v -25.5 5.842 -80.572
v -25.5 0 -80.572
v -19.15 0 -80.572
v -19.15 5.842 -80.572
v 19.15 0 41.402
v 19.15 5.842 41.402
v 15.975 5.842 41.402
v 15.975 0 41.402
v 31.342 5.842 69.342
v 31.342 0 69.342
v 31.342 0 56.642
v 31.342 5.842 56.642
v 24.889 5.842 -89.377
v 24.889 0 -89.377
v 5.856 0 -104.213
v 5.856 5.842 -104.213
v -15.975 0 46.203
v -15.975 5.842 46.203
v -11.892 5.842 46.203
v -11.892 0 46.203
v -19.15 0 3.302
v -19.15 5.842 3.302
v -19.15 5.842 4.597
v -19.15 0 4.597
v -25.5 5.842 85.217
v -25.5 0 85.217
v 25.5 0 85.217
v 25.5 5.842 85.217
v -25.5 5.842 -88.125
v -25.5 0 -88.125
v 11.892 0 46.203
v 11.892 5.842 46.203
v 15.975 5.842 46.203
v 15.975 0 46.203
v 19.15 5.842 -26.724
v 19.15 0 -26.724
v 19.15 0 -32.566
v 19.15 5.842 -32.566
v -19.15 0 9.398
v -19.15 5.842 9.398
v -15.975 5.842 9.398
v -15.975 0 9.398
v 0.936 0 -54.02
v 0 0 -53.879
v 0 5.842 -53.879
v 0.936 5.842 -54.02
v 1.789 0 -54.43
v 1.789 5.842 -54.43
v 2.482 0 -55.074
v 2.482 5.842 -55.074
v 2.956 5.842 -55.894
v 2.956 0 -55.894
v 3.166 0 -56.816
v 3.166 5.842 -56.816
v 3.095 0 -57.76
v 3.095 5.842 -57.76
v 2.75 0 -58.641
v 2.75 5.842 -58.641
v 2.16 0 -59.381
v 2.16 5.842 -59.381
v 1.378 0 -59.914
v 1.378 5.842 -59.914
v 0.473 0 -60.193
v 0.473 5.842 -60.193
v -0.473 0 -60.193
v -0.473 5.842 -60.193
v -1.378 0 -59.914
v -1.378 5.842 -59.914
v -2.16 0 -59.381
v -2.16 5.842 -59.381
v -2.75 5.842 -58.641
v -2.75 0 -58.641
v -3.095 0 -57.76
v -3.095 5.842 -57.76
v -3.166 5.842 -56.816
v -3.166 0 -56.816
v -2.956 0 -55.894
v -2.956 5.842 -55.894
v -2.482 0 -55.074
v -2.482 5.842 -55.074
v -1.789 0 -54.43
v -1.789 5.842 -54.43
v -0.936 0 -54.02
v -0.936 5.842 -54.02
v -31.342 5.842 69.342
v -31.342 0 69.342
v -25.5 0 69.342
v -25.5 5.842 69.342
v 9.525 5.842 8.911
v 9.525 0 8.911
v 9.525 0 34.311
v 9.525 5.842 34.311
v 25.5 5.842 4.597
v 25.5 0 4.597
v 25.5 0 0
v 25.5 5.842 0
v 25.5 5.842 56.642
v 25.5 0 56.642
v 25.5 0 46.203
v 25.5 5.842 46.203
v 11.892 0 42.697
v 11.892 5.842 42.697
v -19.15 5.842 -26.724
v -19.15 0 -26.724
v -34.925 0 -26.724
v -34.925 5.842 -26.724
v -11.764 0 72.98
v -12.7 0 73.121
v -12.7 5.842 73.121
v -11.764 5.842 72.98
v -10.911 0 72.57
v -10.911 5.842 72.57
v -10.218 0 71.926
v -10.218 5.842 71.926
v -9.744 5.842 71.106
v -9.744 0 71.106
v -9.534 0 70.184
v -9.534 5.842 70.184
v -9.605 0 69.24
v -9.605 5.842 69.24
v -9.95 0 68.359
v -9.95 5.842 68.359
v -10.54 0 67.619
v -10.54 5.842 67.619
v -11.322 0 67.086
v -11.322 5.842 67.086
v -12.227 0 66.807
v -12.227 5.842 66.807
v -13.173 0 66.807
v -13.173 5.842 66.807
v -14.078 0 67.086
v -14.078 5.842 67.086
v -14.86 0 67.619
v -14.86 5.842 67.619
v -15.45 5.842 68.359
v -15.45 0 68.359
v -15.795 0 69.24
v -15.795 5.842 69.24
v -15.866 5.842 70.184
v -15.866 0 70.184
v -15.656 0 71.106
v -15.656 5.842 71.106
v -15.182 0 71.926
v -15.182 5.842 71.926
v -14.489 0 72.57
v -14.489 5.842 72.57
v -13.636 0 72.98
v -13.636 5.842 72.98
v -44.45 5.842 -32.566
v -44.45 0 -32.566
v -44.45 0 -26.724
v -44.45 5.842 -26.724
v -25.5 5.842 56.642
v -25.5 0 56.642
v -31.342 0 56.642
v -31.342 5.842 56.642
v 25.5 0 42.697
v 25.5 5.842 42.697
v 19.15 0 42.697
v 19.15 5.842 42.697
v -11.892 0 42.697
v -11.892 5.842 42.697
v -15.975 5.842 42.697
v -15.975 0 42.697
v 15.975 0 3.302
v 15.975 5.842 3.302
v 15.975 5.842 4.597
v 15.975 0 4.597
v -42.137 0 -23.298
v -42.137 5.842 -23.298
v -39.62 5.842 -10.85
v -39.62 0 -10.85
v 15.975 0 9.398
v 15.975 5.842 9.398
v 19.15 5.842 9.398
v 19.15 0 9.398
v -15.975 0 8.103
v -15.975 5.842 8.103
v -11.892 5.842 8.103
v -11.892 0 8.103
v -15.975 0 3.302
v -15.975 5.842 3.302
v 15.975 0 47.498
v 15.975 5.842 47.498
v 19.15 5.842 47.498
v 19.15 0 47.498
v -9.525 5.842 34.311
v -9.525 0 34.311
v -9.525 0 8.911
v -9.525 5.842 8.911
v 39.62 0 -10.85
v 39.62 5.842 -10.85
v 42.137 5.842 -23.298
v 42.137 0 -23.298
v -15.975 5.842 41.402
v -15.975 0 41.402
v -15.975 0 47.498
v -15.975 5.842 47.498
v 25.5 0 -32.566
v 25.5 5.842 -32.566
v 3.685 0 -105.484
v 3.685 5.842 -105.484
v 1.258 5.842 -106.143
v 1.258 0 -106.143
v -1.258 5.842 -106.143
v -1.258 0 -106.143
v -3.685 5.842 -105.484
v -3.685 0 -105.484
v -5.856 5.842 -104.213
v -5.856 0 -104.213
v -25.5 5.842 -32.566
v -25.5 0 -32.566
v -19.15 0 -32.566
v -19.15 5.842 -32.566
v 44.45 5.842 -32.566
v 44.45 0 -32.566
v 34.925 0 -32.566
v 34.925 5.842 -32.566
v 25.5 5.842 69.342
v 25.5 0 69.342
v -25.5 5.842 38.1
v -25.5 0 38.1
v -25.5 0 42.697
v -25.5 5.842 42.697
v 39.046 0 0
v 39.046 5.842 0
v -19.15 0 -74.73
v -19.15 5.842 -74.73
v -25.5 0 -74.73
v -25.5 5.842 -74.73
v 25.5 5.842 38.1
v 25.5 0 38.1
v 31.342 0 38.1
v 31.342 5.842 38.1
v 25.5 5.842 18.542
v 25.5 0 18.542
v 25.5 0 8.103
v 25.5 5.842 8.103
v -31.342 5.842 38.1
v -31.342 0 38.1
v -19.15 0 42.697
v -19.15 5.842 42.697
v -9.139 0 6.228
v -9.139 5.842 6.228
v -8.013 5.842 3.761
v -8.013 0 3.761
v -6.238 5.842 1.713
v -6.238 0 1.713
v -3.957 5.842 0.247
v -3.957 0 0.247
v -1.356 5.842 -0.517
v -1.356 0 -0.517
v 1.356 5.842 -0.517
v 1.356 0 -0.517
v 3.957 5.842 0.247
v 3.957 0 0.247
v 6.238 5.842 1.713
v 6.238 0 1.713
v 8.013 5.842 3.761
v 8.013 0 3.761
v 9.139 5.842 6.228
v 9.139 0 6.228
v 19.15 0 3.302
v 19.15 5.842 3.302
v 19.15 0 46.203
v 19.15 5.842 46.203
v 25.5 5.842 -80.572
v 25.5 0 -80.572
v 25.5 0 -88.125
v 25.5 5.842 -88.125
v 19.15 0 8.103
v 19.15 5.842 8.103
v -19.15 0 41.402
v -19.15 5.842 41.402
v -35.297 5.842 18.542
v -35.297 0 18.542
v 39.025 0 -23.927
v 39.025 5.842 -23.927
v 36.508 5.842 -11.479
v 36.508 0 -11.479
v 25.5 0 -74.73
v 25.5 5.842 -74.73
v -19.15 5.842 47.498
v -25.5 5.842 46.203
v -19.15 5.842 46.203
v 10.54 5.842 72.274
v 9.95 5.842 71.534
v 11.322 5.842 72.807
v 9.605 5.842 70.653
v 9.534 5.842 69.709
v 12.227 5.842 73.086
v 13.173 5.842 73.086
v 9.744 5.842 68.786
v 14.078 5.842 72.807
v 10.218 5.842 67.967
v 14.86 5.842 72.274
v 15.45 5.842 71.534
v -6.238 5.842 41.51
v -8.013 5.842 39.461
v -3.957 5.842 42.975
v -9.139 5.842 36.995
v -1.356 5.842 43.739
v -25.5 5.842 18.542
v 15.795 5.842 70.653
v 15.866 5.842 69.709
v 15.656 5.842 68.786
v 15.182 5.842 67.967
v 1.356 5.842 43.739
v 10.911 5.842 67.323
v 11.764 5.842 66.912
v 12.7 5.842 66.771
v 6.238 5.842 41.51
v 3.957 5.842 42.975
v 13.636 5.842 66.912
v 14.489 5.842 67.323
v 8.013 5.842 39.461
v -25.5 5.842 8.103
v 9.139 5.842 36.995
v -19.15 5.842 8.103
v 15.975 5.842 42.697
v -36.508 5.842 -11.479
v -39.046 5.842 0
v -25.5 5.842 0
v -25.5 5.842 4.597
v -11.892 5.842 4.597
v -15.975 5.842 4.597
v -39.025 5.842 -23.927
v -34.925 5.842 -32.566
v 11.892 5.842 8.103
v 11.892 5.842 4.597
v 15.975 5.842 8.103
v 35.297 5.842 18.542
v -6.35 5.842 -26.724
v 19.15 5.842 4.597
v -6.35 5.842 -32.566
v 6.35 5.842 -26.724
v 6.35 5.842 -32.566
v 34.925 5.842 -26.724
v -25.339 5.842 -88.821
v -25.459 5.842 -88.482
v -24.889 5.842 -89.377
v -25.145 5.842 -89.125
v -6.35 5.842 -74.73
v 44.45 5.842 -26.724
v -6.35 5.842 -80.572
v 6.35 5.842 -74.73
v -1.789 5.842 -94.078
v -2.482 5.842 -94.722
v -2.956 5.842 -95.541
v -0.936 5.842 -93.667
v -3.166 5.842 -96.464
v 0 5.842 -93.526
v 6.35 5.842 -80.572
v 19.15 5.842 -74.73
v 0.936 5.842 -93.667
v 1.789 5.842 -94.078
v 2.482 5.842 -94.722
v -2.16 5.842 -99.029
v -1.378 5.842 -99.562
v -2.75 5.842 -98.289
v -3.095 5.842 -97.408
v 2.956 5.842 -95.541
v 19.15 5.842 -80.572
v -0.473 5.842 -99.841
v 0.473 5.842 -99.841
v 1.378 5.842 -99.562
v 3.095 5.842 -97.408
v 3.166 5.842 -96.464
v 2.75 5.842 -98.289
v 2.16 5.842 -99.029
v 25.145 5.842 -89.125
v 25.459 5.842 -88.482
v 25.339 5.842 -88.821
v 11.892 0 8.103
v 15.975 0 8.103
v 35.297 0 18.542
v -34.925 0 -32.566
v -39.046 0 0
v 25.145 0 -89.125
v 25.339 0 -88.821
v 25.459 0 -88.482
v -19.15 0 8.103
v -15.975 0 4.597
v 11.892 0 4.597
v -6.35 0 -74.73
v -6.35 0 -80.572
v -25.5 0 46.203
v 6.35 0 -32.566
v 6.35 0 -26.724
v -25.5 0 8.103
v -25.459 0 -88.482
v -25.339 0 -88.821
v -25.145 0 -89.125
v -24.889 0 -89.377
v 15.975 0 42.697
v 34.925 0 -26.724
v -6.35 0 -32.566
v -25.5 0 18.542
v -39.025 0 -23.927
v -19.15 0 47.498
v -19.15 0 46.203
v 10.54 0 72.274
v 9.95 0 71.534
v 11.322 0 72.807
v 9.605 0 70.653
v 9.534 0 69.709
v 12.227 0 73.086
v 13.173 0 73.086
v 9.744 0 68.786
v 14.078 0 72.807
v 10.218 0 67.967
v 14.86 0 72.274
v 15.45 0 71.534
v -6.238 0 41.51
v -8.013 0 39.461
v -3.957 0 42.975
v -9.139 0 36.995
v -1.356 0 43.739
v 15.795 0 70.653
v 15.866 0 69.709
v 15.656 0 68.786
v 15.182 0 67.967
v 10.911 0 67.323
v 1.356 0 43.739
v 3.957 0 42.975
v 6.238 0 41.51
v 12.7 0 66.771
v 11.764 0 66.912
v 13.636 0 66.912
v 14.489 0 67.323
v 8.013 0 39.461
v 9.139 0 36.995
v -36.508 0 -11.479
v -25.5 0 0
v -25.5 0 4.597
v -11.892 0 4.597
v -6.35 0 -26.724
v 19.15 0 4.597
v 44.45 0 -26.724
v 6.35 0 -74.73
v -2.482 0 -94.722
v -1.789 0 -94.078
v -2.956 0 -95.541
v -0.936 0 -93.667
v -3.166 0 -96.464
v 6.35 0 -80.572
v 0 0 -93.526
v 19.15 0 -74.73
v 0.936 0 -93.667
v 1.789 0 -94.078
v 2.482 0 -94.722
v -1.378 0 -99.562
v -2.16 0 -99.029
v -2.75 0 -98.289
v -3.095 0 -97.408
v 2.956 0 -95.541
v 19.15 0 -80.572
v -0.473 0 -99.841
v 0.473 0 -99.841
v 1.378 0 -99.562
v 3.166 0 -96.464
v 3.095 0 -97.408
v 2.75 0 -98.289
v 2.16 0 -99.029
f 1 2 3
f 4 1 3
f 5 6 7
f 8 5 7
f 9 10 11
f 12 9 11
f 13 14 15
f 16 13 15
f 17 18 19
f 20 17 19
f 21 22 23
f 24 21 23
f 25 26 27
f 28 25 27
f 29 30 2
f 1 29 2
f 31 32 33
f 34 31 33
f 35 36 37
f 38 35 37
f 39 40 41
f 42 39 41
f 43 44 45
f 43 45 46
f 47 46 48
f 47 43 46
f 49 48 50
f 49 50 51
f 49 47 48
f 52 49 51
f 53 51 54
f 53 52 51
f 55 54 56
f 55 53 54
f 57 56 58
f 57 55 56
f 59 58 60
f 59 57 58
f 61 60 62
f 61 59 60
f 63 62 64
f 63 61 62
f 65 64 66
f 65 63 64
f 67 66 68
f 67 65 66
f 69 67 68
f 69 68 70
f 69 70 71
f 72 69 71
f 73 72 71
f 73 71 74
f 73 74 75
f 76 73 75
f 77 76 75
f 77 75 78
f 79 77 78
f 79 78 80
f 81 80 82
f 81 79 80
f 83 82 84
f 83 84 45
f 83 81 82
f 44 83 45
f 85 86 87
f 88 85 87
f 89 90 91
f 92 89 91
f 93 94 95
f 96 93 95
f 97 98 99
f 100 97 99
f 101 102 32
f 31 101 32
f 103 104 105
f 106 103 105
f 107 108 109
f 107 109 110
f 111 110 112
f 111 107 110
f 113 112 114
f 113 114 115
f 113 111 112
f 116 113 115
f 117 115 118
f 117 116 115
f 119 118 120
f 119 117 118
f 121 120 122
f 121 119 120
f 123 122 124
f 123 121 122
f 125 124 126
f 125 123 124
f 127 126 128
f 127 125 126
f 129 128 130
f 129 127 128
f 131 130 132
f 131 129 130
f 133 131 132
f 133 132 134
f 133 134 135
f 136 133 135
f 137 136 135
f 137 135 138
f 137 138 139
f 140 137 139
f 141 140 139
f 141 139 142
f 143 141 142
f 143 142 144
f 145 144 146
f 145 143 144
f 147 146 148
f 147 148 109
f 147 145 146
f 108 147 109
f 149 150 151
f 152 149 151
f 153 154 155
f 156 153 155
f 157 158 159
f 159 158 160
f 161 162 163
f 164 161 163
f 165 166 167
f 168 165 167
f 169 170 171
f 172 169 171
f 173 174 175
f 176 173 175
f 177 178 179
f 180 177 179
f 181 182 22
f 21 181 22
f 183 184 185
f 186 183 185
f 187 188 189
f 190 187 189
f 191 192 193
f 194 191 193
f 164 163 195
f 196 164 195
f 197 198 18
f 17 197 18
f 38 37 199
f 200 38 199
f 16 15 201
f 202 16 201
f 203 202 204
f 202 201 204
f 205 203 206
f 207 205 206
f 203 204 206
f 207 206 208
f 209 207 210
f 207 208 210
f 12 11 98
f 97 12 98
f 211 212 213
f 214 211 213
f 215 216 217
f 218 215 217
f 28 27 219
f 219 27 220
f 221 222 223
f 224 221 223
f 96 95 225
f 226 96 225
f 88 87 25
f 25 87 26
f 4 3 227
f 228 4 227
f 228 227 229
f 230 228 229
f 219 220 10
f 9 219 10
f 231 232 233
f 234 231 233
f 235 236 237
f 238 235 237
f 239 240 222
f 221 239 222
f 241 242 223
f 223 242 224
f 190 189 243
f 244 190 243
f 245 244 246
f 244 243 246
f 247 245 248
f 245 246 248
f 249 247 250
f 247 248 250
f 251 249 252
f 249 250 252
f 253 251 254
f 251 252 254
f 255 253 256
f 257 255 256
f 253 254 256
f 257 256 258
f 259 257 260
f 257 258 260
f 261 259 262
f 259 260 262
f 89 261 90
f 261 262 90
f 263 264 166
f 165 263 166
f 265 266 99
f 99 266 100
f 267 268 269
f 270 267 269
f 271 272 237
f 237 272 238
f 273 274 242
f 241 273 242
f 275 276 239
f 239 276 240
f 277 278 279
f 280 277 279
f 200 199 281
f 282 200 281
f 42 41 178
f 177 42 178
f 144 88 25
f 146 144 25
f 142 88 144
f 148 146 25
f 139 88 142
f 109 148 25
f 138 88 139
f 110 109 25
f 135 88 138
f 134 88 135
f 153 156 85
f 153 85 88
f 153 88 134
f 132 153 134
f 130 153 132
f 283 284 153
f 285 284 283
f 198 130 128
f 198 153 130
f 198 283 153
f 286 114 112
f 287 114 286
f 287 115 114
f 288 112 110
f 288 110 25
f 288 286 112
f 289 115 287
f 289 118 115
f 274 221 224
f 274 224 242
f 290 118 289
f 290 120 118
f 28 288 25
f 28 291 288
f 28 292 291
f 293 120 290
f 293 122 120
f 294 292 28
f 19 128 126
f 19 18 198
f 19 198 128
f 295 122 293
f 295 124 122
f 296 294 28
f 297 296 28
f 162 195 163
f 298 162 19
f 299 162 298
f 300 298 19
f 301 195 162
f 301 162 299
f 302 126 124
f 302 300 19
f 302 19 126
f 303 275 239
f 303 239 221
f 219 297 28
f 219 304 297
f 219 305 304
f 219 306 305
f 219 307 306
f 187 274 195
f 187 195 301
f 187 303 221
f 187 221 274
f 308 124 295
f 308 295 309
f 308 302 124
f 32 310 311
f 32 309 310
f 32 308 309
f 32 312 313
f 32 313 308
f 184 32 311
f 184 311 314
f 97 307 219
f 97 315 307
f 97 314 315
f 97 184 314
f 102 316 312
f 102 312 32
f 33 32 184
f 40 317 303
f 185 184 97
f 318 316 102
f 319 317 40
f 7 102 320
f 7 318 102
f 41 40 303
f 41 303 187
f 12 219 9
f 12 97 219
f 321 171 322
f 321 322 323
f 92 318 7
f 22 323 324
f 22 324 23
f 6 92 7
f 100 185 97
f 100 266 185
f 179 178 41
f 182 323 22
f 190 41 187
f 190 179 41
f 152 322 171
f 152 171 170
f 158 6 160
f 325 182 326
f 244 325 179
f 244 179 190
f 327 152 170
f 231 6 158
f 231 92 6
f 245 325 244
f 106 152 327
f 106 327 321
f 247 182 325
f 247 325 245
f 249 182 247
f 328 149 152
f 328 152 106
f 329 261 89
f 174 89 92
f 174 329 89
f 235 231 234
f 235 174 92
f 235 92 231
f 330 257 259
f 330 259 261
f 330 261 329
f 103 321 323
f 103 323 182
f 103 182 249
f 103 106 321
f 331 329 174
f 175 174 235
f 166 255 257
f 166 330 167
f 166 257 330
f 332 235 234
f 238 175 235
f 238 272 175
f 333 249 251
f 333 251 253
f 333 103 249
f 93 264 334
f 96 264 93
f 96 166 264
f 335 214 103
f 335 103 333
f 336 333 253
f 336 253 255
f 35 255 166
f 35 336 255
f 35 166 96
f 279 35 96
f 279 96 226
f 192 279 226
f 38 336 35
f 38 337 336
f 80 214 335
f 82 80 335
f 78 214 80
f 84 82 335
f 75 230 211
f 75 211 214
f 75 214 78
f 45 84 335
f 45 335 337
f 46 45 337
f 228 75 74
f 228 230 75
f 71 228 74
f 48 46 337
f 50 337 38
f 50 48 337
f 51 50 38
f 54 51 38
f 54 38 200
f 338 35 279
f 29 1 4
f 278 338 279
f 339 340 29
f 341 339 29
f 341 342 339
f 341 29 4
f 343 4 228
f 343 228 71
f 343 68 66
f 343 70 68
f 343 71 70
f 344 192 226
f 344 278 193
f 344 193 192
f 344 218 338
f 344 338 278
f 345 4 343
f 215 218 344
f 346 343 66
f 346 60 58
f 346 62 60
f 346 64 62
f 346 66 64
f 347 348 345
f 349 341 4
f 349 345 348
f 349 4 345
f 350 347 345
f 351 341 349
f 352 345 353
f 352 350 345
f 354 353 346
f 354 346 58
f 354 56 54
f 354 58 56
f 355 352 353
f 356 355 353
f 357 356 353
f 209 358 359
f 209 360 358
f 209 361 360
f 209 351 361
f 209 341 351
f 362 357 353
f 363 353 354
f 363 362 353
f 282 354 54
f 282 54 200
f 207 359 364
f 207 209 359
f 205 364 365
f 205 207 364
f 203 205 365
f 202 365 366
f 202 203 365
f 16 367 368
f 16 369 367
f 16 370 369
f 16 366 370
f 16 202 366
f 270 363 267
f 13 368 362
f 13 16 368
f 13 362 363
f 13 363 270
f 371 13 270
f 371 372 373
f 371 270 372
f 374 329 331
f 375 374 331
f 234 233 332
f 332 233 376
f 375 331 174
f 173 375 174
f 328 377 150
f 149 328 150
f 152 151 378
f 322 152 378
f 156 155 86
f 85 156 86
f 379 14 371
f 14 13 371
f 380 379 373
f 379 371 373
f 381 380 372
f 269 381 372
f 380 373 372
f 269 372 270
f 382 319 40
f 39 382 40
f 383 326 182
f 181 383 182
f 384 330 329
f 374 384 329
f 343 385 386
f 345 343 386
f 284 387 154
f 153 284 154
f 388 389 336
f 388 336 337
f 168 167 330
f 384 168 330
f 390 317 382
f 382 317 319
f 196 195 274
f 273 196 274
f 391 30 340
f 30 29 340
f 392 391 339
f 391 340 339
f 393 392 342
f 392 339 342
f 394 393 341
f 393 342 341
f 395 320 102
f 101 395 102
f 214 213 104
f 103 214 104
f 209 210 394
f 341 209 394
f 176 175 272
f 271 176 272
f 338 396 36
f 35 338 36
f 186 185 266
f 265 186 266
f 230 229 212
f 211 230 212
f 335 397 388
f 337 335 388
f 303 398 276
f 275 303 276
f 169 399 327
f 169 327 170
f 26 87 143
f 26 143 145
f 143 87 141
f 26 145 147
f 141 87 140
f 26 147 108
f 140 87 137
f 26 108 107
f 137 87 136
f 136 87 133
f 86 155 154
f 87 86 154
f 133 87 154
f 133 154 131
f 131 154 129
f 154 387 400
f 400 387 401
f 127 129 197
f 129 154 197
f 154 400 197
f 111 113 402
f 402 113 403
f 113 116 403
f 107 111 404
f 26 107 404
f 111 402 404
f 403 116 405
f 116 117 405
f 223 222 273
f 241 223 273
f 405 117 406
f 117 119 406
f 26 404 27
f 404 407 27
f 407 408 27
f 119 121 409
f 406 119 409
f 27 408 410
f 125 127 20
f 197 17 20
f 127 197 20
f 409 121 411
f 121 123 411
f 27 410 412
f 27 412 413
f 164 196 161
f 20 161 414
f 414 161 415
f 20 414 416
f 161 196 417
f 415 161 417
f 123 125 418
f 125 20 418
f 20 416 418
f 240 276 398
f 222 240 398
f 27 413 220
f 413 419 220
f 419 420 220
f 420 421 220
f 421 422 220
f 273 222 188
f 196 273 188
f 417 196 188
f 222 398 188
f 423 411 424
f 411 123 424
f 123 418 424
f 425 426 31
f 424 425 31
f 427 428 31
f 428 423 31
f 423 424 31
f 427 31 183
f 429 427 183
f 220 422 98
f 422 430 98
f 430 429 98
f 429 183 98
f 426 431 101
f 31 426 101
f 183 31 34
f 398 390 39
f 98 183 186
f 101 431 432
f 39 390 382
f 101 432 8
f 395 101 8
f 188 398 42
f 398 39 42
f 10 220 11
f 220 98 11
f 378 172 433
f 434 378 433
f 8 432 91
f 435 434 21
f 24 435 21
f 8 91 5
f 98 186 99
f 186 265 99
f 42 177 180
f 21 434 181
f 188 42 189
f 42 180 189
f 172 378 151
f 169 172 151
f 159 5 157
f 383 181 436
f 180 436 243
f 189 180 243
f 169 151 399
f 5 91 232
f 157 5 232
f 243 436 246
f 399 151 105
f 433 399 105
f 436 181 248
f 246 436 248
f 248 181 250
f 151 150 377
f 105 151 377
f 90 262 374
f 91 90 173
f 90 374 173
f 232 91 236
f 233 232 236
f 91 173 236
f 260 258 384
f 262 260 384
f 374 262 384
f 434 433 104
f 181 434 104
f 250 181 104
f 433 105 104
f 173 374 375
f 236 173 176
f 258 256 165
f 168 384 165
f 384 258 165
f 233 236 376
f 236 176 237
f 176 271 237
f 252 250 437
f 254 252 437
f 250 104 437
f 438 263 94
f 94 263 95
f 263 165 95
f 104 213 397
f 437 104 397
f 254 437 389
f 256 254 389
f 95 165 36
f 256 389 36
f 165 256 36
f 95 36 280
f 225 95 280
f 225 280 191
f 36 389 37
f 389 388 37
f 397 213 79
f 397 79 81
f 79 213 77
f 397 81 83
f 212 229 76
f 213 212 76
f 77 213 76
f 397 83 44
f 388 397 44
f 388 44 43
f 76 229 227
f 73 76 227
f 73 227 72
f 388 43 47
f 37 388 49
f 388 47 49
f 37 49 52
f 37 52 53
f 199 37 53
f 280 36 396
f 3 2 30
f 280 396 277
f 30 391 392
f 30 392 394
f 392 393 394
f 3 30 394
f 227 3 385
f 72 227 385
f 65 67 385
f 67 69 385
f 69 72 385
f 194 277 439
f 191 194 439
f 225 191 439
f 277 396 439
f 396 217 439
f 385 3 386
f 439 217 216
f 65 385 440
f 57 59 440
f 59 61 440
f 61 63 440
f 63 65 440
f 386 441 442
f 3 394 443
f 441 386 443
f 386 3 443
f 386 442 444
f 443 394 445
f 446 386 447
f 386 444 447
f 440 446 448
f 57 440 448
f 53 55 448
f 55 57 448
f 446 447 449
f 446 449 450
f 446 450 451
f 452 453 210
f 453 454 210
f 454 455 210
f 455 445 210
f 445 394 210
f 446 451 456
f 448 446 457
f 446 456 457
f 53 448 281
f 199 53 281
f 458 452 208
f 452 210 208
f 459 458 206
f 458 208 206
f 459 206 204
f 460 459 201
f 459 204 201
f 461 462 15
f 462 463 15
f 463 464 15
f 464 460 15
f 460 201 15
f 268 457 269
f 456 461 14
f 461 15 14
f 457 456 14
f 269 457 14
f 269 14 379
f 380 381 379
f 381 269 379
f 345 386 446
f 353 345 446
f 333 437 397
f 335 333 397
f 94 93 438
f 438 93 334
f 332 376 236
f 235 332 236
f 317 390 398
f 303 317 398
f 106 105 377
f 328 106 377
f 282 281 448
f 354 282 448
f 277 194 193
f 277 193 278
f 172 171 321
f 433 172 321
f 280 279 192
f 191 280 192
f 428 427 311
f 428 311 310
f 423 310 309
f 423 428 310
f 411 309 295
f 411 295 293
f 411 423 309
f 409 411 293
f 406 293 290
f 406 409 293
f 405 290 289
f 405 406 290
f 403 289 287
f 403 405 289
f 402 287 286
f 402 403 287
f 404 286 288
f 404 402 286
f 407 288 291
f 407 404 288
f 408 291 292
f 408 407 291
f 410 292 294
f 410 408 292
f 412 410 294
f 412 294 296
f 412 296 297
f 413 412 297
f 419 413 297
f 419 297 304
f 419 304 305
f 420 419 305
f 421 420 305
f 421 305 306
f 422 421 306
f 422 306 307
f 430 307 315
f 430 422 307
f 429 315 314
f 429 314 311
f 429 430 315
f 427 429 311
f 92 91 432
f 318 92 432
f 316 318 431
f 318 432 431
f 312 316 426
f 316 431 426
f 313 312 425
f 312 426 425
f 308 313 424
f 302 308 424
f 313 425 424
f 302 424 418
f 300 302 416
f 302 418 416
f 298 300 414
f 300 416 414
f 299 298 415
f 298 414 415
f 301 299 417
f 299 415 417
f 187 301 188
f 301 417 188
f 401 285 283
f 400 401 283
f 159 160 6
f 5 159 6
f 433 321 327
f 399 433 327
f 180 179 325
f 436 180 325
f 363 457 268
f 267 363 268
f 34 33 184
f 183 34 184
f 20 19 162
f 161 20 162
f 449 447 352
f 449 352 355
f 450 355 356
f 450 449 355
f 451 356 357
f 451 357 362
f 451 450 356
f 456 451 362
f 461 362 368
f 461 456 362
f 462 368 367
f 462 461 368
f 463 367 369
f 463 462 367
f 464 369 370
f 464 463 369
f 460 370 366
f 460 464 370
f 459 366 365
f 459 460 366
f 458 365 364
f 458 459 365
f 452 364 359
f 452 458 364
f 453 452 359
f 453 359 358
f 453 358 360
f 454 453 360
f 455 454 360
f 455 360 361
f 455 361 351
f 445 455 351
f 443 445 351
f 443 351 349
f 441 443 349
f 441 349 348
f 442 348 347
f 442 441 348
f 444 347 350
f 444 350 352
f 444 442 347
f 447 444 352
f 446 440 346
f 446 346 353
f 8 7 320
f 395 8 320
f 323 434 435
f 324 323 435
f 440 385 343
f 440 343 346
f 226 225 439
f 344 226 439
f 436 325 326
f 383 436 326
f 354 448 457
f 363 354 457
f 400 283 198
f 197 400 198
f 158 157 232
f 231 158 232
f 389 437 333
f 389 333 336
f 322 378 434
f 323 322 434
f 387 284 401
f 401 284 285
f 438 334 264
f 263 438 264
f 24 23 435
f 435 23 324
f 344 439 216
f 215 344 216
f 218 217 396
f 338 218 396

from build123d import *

# Parameters (mm, degrees)
SKETCH1_R           = 3.175
SKETCH1_W           = 12.7
SKETCH1_H           = 5.842
BOSS_EXTRUDE1_DEPTH = 5.842
CUT_EXTRUDE1_DEPTH  = 116.299365115
FILLET1_R           = 1.5875
CUT_EXTRUDE2_DEPTH  = 116.299365115


with BuildPart() as part:
    # Sketch1 → Boss-Extrude1 (new body)
    with BuildSketch(Plane(origin=(0, 0, 0), x_dir=(1, 0, 0), z_dir=(0, 1, 0))):
        with BuildLine():
            Line((31.75, 26.724230903), (25.5, 26.724230903))
            Line((25.5, 26.724230903), (19.15, 26.724230903))
            Line((19.15, 26.724230903), (19.15, 32.566230903))
            Line((19.15, 32.566230903), (25.5, 32.566230903))
            Line((25.5, 32.566230903), (25.5, 74.730230903))
            Line((25.5, 74.730230903), (19.15, 74.730230903))
            Line((19.15, 74.730230903), (19.15, 80.572230903))
            Line((19.15, 80.572230903), (25.5, 80.572230903))
            Line((25.5, 80.572230903), (25.5, 88.9))
            Line((25.5, 88.9), (5.856060063, 104.213366787))
            ThreePointArc((5.856060063, 104.213366787), (0, 106.226230903), (-5.856060063, 104.213366787))
            Line((-5.856060063, 104.213366787), (-25.5, 88.9))
            Line((-25.5, 88.9), (-25.5, 80.572230903))
            Line((-25.5, 80.572230903), (-19.15, 80.572230903))
            Line((-19.15, 80.572230903), (-19.15, 74.730230903))
            Line((-19.15, 74.730230903), (-25.5, 74.730230903))
            Line((-25.5, 74.730230903), (-25.5, 32.566230903))
            Line((-25.5, 32.566230903), (-19.15, 32.566230903))
            Line((-19.15, 32.566230903), (-19.15, 26.724230903))
            Line((-19.15, 26.724230903), (-25.5, 26.724230903))
            Line((-25.5, 26.724230903), (-31.75, 26.724230903))
            Line((-31.75, 26.724230903), (-34.925, 26.724230903))
            Line((-34.925, 26.724230903), (-34.925, 32.566230903))
            Line((-34.925, 32.566230903), (-44.45, 32.566230903))
            Line((-44.45, 32.566230903), (-44.45, 26.724230903))
            Line((-44.45, 26.724230903), (-39.046137682, 0))
            Line((-39.046137682, 0), (-31.342, 0))
            Line((-31.342, 0), (-25.5, 0))
            Line((-25.5, 0), (-25.5, -18.542))
            Line((-25.5, -18.542), (-31.342, -18.542))
            Line((-31.342, -18.542), (-35.296790677, -18.542))
            Line((-35.296790677, -18.542), (-31.342, -38.1))
            Line((-31.342, -38.1), (-25.5, -38.1))
            Line((-25.5, -38.1), (-25.5, -56.642))
            Line((-25.5, -56.642), (-31.342, -56.642))
            Line((-31.342, -56.642), (-31.342, -69.342))
            Line((-31.342, -69.342), (-25.5, -69.342))
            Line((-25.5, -69.342), (-25.5, -85.217))
            Line((-25.5, -85.217), (25.5, -85.217))
            Line((25.5, -85.217), (25.5, -69.342))
            Line((25.5, -69.342), (31.342, -69.342))
            Line((31.342, -69.342), (31.342, -56.642))
            Line((31.342, -56.642), (25.5, -56.642))
            Line((25.5, -56.642), (25.5, -38.1))
            Line((25.5, -38.1), (31.342, -38.1))
            Line((31.342, -38.1), (35.296790677, -18.542))
            Line((35.296790677, -18.542), (31.342, -18.542))
            Line((31.342, -18.542), (25.5, -18.542))
            Line((25.5, -18.542), (25.5, 0))
            Line((25.5, 0), (31.342, 0))
            Line((31.342, 0), (39.046137682, 0))
            Line((39.046137682, 0), (44.45, 26.724230903))
            Line((44.45, 26.724230903), (44.45, 32.566230903))
            Line((44.45, 32.566230903), (34.925, 32.566230903))
            Line((34.925, 32.566230903), (34.925, 26.724230903))
            Line((34.925, 26.724230903), (31.75, 26.724230903))
        make_face()
        with Locations(Location((0, 96.701230903, 0), (0, 0, 270))):
            Circle(SKETCH1_R, mode=Mode.SUBTRACT)
        with Locations(Location((0, 57.053608903, 0), (0, 0, 270))):
            Circle(SKETCH1_R, mode=Mode.SUBTRACT)
        with Locations(Location((-12.7, -69.946391097, 0), (0, 0, 270))):
            Circle(SKETCH1_R, mode=Mode.SUBTRACT)
        with Locations(Location((12.7, -69.946391097, 0), (0, 0, 90))):
            Circle(SKETCH1_R, mode=Mode.SUBTRACT)
        with Locations((0, 77.651230903)):
            Rectangle(SKETCH1_W, SKETCH1_H, mode=Mode.SUBTRACT)
        with BuildLine():
            Line((9.525, -8.911080097), (9.525, -34.311080097))
            ThreePointArc((9.525, -34.311080097), (0, -43.836080097), (-9.525, -34.311080097))
            Line((-9.525, -34.311080097), (-9.525, -8.911080097))
            ThreePointArc((-9.525, -8.911080097), (0, 0.613919903), (9.525, -8.911080097))
        make_face(mode=Mode.SUBTRACT)
        with Locations((0, 29.645230903)):
            Rectangle(SKETCH1_W, SKETCH1_H, mode=Mode.SUBTRACT)
    extrude(amount=BOSS_EXTRUDE1_DEPTH)

    # Sketch2 → Cut-Extrude1 (cut, through all)
    with BuildSketch(Plane(origin=(0, 5.842, 0), x_dir=(1, 0, 0), z_dir=(0, 1, 0))):
        Polygon((-15.975, -42.6974), (-15.975, -41.402), (-19.15, -41.402), (-19.15, -42.6974), (-25.5, -42.6974), (-25.5, -46.2026), (-19.15, -46.2026), (-19.15, -47.498), (-15.975, -47.498), (-15.975, -46.2026), (-11.891999892, -46.2026), (-11.891999892, -42.6974), align=None)
        Polygon((-19.15, -8.1026), (-19.15, -9.398), (-15.975, -9.398), (-15.975, -8.1026), (-11.891999892, -8.1026), (-11.891999892, -4.5974), (-15.975, -4.5974), (-15.975, -3.302), (-19.15, -3.302), (-19.15, -4.5974), (-25.5, -4.5974), (-25.5, -8.1026), align=None)
        Polygon((15.975, -8.1026), (15.975, -9.398), (19.15, -9.398), (19.15, -8.1026), (25.5, -8.1026), (25.5, -4.5974), (19.15, -4.5974), (19.15, -3.302), (15.975, -3.302), (15.975, -4.5974), (11.891999892, -4.5974), (11.891999892, -8.1026), align=None)
        Polygon((19.15, -42.6974), (19.15, -41.402), (15.975, -41.402), (15.975, -42.6974), (11.891999892, -42.6974), (11.891999892, -46.2026), (15.975, -46.2026), (15.975, -47.498), (19.15, -47.498), (19.15, -46.2026), (25.5, -46.2026), (25.5, -42.6974), align=None)
    extrude(amount=-CUT_EXTRUDE1_DEPTH, mode=Mode.SUBTRACT)

    # Fillet1
    fillet1_edges = [part.edges().sort_by_distance(p)[0] for p in [
        (-25.5, 2.921, -88.9),
        (25.5, 2.921, -88.9),
    ]]
    fillet(fillet1_edges, radius=FILLET1_R)

    # Sketch3 → Cut-Extrude2 (cut, through all)
    with BuildSketch(Plane(origin=(0, 5.842, 0), x_dir=(1, 0, 0), z_dir=(0, 1, 0))):
        Polygon((-42.137472374, 23.29757819), (-39.620370832, 10.849518107), (-36.508355811, 11.478793492), (-39.025457353, 23.926853575), align=None)
        Polygon((39.025457353, 23.926853575), (36.508355811, 11.478793492), (39.620370832, 10.849518107), (42.137472374, 23.29757819), align=None)
    extrude(amount=-CUT_EXTRUDE2_DEPTH, mode=Mode.SUBTRACT)


solid = part.part
